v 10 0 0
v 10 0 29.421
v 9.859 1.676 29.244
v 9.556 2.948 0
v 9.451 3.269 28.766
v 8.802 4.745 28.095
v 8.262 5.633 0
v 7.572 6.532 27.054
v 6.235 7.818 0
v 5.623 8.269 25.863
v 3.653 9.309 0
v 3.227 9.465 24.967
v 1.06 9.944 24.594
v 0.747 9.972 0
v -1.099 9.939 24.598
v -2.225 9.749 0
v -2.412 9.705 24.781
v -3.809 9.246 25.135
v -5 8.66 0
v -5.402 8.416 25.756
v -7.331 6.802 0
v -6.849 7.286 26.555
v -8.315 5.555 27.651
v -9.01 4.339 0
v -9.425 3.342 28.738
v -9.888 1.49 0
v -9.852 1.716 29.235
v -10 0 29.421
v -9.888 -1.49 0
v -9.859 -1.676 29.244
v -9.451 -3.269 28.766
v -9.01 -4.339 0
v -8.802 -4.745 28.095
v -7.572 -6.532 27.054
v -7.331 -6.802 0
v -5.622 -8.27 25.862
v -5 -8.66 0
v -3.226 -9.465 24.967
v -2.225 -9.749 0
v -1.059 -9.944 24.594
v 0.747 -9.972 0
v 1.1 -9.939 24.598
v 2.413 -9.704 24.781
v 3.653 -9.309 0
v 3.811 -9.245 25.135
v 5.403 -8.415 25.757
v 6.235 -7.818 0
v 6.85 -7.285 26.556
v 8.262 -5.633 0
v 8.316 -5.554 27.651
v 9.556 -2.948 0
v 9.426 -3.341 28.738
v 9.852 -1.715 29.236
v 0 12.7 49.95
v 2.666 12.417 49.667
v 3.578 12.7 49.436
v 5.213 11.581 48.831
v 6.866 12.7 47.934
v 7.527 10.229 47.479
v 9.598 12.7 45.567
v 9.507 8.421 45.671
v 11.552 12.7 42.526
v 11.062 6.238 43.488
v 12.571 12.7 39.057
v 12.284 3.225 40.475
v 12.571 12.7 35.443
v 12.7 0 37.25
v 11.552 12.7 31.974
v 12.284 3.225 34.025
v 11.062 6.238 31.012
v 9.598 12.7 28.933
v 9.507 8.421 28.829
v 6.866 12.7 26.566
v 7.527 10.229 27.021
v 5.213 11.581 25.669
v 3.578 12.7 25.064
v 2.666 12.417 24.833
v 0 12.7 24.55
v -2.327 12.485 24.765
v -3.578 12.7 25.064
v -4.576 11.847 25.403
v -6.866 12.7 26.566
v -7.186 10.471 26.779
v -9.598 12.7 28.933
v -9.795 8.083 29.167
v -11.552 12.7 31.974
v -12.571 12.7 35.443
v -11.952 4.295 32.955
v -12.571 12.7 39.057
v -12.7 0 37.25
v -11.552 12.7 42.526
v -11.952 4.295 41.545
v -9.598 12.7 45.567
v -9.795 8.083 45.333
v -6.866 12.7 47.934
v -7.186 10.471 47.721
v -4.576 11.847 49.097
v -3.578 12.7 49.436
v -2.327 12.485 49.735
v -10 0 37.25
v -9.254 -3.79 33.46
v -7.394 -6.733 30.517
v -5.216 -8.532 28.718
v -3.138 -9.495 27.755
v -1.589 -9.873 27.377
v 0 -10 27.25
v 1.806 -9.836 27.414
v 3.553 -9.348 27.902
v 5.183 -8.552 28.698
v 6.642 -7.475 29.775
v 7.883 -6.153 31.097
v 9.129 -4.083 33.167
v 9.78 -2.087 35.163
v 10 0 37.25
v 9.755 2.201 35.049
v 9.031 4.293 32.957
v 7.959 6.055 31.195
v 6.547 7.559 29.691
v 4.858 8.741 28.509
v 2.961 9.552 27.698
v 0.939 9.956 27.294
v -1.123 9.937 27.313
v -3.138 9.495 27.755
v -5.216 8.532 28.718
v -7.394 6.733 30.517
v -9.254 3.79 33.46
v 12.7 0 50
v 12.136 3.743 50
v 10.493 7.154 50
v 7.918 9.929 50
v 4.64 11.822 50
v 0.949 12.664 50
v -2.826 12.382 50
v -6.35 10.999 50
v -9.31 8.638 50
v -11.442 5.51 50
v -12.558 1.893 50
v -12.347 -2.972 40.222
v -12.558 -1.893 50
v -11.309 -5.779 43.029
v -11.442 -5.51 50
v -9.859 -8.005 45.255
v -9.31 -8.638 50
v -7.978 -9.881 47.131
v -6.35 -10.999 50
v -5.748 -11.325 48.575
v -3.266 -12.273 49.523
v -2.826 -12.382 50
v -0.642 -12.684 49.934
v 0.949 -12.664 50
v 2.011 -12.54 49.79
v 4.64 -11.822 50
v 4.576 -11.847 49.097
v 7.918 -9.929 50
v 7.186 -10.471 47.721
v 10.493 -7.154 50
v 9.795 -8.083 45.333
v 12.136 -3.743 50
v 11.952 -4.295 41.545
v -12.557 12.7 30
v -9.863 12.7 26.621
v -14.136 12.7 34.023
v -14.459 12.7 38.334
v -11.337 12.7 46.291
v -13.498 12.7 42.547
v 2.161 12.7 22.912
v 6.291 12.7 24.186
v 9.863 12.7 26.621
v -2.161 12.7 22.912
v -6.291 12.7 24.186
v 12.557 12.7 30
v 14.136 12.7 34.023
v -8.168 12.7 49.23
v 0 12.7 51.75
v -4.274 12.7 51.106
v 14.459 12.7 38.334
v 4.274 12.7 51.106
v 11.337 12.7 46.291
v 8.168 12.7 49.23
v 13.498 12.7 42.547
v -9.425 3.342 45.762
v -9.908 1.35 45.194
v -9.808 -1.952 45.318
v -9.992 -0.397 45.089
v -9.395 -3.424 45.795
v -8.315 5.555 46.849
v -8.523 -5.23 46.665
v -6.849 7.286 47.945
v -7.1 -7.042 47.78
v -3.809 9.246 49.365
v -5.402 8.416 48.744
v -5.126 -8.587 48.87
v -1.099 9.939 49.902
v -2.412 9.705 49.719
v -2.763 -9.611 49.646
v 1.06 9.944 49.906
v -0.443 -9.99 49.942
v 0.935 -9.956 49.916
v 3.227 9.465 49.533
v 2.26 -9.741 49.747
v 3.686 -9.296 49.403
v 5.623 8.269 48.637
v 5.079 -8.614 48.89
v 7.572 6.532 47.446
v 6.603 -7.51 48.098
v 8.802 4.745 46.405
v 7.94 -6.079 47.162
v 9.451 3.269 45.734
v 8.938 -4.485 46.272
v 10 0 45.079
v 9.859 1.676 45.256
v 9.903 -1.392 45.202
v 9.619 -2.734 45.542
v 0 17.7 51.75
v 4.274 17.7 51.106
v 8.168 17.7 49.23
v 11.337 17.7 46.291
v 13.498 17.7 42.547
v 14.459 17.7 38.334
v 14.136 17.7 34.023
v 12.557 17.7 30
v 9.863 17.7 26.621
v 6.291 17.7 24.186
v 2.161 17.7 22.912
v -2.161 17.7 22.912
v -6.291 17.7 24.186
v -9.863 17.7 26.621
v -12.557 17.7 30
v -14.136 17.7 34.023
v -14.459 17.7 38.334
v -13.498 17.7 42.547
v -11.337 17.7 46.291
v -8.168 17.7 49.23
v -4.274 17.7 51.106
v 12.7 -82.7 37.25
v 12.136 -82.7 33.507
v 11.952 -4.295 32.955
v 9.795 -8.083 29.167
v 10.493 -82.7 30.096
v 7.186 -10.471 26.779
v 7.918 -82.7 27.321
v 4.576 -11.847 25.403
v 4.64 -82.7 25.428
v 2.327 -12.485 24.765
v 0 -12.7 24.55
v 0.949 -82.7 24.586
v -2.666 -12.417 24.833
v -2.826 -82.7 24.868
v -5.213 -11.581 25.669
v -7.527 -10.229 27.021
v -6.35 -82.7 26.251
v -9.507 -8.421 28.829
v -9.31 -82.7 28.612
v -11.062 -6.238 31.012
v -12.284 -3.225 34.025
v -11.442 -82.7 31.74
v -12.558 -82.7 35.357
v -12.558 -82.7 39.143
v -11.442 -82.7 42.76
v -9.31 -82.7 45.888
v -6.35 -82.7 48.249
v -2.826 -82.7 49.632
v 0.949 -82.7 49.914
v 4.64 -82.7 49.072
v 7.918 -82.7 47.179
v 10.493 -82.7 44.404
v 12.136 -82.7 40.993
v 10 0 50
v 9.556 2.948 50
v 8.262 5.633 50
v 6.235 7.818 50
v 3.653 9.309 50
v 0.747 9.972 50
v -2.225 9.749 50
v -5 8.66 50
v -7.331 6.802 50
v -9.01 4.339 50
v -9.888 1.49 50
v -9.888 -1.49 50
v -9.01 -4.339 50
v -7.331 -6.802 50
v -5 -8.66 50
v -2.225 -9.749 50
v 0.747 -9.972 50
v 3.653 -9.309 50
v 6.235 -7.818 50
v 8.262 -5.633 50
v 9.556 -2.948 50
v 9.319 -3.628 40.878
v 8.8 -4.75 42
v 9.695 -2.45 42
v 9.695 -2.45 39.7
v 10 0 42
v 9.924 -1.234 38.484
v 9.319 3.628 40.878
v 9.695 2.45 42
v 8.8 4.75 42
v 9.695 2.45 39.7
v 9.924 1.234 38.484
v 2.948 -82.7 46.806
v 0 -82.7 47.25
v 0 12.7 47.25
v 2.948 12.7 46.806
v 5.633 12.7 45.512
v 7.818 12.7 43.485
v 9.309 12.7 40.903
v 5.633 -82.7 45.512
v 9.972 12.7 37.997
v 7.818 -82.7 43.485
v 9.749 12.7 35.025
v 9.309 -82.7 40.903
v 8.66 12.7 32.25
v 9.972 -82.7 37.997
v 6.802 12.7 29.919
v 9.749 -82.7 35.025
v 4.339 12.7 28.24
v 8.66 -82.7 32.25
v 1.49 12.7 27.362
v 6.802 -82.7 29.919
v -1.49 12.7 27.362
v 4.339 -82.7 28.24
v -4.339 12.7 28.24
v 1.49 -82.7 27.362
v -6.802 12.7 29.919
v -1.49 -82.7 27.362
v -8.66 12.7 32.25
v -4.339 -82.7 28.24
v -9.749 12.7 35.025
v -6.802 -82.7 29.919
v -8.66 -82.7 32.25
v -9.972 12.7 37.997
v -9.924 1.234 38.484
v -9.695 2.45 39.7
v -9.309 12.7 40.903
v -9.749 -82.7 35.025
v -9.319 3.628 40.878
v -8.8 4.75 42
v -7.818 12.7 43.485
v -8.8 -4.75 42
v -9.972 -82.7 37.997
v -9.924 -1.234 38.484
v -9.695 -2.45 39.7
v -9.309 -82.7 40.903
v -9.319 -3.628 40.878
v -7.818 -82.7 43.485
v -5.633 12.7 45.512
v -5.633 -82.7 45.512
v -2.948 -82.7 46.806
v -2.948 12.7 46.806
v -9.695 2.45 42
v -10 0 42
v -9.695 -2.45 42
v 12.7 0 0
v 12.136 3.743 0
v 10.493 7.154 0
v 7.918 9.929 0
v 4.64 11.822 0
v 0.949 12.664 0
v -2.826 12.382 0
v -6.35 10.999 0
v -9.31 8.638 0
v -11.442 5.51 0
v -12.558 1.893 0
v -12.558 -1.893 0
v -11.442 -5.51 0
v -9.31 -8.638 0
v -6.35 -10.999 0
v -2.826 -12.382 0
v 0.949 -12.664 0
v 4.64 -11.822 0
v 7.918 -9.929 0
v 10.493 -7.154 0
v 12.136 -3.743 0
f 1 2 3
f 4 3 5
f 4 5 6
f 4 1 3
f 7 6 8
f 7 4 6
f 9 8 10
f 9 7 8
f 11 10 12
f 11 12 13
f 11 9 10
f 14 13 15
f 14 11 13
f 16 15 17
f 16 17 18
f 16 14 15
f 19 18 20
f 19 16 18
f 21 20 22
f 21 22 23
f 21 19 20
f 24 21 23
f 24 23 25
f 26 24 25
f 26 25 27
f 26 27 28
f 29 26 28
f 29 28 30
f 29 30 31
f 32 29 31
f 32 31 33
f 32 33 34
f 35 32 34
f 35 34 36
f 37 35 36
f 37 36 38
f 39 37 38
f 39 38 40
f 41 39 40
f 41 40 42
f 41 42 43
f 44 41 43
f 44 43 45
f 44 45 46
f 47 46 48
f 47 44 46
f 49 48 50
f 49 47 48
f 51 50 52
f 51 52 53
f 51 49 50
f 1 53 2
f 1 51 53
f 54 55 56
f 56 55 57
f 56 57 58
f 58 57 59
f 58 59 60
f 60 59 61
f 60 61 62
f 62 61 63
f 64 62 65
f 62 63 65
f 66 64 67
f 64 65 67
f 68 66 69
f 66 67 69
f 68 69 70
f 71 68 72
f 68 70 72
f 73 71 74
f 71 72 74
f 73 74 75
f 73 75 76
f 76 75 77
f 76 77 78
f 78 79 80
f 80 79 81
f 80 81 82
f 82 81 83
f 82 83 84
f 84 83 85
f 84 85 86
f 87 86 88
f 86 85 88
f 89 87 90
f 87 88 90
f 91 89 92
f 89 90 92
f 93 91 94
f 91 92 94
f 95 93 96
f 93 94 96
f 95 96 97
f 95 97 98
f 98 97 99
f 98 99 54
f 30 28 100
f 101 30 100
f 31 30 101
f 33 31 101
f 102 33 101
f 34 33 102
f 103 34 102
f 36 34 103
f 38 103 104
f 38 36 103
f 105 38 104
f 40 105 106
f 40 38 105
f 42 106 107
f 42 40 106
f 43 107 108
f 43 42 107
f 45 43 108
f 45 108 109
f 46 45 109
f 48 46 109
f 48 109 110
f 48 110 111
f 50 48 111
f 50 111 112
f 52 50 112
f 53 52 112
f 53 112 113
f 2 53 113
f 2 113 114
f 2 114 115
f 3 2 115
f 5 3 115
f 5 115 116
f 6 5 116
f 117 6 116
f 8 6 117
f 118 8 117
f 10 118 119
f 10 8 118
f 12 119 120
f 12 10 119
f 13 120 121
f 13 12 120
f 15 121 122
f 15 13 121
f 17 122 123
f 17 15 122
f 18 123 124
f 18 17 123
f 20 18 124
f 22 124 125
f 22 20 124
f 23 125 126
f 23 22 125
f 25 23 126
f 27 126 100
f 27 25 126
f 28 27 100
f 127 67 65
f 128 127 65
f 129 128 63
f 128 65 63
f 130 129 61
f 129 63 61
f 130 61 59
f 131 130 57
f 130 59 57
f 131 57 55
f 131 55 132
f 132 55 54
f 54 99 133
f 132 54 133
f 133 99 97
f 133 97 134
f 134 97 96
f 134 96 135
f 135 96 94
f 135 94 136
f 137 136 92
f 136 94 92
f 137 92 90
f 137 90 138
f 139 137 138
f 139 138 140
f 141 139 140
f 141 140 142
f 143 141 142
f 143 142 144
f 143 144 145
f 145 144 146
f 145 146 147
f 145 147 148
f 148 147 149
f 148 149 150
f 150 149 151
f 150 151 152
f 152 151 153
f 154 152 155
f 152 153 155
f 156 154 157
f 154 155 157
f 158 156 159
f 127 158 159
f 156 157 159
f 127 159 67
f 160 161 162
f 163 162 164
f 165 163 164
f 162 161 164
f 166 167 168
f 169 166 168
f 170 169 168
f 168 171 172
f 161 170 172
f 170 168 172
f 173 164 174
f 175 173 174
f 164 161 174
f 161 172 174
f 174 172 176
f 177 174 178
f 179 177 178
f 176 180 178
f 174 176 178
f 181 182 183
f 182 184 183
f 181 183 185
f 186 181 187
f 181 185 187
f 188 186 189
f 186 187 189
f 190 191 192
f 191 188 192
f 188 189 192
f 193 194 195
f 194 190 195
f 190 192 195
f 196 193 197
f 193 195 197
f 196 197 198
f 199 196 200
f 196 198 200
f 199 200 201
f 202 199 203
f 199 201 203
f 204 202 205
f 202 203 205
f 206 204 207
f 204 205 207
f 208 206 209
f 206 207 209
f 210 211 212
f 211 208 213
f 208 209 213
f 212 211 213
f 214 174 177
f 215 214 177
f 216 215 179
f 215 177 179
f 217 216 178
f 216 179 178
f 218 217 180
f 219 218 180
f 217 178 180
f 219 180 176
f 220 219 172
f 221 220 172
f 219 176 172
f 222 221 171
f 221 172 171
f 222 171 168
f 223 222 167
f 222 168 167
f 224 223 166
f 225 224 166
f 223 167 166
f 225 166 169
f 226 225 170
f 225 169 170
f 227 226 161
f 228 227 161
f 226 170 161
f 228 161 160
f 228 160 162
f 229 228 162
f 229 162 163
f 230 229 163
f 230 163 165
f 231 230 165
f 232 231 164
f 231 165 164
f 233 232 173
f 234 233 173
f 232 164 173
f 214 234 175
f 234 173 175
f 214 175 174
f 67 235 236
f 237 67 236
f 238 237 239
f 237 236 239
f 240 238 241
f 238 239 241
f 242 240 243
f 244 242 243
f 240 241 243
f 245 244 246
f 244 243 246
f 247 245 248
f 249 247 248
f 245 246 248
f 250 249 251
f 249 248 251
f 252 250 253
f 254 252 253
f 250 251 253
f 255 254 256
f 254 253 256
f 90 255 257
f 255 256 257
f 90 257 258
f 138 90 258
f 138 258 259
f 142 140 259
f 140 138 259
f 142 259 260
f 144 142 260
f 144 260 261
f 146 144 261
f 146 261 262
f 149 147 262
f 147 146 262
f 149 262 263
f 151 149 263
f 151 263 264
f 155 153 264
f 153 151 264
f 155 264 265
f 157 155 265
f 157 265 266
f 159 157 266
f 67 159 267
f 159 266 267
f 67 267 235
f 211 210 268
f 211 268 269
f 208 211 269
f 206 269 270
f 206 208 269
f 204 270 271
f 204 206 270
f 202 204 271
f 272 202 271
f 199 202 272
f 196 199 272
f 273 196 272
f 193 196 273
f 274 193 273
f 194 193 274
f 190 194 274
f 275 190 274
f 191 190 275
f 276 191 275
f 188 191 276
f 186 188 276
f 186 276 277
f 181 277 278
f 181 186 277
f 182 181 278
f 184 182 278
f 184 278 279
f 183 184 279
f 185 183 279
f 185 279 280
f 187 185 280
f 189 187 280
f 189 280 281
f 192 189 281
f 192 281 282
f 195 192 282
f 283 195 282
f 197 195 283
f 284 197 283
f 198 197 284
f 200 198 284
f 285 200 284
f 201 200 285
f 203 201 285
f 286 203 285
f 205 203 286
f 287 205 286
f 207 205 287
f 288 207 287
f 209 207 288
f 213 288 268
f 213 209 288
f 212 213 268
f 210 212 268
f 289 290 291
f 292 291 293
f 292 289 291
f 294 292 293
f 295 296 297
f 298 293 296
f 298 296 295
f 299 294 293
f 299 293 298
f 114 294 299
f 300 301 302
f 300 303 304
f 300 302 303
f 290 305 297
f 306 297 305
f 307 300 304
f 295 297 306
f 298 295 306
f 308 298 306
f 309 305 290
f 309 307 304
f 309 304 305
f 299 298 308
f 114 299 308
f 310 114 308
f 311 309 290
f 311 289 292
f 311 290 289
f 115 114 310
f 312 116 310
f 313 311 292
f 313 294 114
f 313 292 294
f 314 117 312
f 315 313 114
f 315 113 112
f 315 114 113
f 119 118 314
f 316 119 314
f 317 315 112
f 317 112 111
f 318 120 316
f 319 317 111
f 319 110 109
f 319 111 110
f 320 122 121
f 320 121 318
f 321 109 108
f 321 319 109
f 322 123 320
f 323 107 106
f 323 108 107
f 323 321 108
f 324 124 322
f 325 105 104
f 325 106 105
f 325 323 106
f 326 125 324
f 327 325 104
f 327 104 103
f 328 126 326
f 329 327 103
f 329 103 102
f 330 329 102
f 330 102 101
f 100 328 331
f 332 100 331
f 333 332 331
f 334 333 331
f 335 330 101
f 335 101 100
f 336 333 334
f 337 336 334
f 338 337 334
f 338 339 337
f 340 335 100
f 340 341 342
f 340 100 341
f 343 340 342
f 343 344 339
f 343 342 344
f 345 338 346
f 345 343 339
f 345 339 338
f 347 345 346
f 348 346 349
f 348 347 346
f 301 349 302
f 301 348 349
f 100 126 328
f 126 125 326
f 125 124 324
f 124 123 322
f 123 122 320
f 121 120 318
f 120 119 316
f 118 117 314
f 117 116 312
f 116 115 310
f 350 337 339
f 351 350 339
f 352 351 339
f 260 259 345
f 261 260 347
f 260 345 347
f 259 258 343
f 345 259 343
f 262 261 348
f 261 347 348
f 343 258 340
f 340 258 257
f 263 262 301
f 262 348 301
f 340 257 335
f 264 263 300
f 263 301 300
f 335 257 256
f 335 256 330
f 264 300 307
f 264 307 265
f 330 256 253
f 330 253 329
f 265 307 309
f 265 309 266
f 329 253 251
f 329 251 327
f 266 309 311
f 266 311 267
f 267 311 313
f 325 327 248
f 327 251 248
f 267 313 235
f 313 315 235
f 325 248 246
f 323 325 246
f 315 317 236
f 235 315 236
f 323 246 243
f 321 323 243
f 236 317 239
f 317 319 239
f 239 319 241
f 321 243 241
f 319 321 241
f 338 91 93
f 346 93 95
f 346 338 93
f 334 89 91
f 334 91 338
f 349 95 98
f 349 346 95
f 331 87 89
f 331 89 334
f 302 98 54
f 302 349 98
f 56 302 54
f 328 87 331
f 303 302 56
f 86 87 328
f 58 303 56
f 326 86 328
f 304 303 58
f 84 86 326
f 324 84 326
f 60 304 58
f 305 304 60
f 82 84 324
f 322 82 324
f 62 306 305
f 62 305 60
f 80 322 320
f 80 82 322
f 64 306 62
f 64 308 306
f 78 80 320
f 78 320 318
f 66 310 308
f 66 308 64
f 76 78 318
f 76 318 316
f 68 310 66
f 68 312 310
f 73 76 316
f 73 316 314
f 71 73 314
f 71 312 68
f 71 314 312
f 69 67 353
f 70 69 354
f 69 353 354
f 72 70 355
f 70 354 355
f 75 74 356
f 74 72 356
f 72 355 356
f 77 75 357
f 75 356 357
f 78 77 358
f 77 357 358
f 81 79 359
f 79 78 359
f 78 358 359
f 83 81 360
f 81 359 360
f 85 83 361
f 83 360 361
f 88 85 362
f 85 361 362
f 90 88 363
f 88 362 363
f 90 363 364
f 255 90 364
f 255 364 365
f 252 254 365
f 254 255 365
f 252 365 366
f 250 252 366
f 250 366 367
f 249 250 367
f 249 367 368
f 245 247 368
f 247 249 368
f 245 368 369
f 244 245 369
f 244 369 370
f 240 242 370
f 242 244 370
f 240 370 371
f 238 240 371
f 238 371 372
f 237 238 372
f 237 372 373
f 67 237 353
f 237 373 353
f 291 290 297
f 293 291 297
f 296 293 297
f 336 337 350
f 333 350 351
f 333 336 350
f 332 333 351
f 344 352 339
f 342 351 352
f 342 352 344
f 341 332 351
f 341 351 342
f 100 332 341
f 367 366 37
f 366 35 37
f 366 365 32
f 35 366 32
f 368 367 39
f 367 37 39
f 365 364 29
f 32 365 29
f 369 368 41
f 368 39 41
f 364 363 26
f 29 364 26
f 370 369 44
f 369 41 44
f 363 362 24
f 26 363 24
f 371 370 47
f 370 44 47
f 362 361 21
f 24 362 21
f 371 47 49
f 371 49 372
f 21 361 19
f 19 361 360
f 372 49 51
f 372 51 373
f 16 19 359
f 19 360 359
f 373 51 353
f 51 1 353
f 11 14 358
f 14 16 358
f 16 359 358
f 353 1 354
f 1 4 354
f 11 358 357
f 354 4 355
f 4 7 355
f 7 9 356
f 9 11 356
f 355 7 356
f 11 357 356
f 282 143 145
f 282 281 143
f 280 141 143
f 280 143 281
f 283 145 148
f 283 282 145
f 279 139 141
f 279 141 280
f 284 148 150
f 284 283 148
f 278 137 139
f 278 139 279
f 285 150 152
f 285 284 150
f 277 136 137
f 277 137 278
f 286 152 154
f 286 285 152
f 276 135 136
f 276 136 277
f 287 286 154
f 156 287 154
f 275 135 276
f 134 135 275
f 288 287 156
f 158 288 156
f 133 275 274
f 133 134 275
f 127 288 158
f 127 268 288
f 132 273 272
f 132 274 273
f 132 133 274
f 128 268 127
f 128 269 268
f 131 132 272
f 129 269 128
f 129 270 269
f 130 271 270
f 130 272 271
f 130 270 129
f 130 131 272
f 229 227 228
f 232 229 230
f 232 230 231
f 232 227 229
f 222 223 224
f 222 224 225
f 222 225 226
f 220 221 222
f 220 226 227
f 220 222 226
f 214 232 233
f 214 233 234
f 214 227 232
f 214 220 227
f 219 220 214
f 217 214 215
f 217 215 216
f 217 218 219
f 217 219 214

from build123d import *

# Parameters (mm, degrees)
CROQUIS1_R                   = 12.7
CROQUIS1_R_2                 = 10
SALIENTE_EXTRUIR1_DEPTH      = 50
SALIENTE_EXTRUIR2_DEPTH      = 25.4
SALIENTE_EXTRUIR2_DEPTH_BACK = 70
CROQUIS2_R                   = 12.7
CORTAR_EXTRUIR1_DEPTH        = 87.955678423
CORTAR_EXTRUIR1_DEPTH_BACK   = 87.955678423
CROQUIS3_R                   = 10
CROQUIS4_R                   = 10
CORTAR_EXTRUIR2_DEPTH        = 42
CROQUIS5_R                   = 14.5
SALIENTE_EXTRUIR4_DEPTH      = 5


with BuildPart() as part:
    # Croquis1 → Saliente-Extruir1 (new body)
    with BuildSketch(Plane.XY):
        Circle(CROQUIS1_R)
        Circle(CROQUIS1_R_2, mode=Mode.SUBTRACT)
    extrude(amount=SALIENTE_EXTRUIR1_DEPTH)

    # Croquis2 → Saliente-Extruir2 (add, two sides: drawn at the far end of the back side and taken through both)
    with BuildSketch(Plane(origin=(0, -12.7, 0), x_dir=(1, 0, 0), z_dir=(0, 1, 0)).offset(-SALIENTE_EXTRUIR2_DEPTH_BACK)):
        with Locations((0, -37.25)):
            Circle(CROQUIS2_R)
    extrude(amount=SALIENTE_EXTRUIR2_DEPTH + SALIENTE_EXTRUIR2_DEPTH_BACK)

    # Croquis3 → Cortar-Extruir1 (cut, two sides: drawn at the far end of the back side and taken through both)
    with BuildSketch(Plane(origin=(0, -12.7, 0), x_dir=(1, 0, 0), z_dir=(0, 1, 0)).offset(-CORTAR_EXTRUIR1_DEPTH_BACK)):
        with Locations(Location((0, -37.25, 0), (0, 0, 270))):
            Circle(CROQUIS3_R)
    extrude(amount=CORTAR_EXTRUIR1_DEPTH + CORTAR_EXTRUIR1_DEPTH_BACK, mode=Mode.SUBTRACT)

    # Croquis4 → Cortar-Extruir2 (cut)
    with BuildSketch(Plane.XY):
        with Locations(Location((0, 0, 0), (0, 0, 180))):
            Circle(CROQUIS4_R)
    extrude(amount=CORTAR_EXTRUIR2_DEPTH, mode=Mode.SUBTRACT)


with BuildPart() as body_2:
    # Croquis5 → Saliente-Extruir4 (new body)
    with BuildSketch(Plane(origin=(0, 12.7, 0), x_dir=(1, 0, 0), z_dir=(0, 1, 0))):
        with Locations(Location((0, -37.25, 0), (0, 0, 270))):
            Circle(CROQUIS5_R)
    extrude(amount=SALIENTE_EXTRUIR4_DEPTH)


solid = Compound([part.part, body_2.part])
